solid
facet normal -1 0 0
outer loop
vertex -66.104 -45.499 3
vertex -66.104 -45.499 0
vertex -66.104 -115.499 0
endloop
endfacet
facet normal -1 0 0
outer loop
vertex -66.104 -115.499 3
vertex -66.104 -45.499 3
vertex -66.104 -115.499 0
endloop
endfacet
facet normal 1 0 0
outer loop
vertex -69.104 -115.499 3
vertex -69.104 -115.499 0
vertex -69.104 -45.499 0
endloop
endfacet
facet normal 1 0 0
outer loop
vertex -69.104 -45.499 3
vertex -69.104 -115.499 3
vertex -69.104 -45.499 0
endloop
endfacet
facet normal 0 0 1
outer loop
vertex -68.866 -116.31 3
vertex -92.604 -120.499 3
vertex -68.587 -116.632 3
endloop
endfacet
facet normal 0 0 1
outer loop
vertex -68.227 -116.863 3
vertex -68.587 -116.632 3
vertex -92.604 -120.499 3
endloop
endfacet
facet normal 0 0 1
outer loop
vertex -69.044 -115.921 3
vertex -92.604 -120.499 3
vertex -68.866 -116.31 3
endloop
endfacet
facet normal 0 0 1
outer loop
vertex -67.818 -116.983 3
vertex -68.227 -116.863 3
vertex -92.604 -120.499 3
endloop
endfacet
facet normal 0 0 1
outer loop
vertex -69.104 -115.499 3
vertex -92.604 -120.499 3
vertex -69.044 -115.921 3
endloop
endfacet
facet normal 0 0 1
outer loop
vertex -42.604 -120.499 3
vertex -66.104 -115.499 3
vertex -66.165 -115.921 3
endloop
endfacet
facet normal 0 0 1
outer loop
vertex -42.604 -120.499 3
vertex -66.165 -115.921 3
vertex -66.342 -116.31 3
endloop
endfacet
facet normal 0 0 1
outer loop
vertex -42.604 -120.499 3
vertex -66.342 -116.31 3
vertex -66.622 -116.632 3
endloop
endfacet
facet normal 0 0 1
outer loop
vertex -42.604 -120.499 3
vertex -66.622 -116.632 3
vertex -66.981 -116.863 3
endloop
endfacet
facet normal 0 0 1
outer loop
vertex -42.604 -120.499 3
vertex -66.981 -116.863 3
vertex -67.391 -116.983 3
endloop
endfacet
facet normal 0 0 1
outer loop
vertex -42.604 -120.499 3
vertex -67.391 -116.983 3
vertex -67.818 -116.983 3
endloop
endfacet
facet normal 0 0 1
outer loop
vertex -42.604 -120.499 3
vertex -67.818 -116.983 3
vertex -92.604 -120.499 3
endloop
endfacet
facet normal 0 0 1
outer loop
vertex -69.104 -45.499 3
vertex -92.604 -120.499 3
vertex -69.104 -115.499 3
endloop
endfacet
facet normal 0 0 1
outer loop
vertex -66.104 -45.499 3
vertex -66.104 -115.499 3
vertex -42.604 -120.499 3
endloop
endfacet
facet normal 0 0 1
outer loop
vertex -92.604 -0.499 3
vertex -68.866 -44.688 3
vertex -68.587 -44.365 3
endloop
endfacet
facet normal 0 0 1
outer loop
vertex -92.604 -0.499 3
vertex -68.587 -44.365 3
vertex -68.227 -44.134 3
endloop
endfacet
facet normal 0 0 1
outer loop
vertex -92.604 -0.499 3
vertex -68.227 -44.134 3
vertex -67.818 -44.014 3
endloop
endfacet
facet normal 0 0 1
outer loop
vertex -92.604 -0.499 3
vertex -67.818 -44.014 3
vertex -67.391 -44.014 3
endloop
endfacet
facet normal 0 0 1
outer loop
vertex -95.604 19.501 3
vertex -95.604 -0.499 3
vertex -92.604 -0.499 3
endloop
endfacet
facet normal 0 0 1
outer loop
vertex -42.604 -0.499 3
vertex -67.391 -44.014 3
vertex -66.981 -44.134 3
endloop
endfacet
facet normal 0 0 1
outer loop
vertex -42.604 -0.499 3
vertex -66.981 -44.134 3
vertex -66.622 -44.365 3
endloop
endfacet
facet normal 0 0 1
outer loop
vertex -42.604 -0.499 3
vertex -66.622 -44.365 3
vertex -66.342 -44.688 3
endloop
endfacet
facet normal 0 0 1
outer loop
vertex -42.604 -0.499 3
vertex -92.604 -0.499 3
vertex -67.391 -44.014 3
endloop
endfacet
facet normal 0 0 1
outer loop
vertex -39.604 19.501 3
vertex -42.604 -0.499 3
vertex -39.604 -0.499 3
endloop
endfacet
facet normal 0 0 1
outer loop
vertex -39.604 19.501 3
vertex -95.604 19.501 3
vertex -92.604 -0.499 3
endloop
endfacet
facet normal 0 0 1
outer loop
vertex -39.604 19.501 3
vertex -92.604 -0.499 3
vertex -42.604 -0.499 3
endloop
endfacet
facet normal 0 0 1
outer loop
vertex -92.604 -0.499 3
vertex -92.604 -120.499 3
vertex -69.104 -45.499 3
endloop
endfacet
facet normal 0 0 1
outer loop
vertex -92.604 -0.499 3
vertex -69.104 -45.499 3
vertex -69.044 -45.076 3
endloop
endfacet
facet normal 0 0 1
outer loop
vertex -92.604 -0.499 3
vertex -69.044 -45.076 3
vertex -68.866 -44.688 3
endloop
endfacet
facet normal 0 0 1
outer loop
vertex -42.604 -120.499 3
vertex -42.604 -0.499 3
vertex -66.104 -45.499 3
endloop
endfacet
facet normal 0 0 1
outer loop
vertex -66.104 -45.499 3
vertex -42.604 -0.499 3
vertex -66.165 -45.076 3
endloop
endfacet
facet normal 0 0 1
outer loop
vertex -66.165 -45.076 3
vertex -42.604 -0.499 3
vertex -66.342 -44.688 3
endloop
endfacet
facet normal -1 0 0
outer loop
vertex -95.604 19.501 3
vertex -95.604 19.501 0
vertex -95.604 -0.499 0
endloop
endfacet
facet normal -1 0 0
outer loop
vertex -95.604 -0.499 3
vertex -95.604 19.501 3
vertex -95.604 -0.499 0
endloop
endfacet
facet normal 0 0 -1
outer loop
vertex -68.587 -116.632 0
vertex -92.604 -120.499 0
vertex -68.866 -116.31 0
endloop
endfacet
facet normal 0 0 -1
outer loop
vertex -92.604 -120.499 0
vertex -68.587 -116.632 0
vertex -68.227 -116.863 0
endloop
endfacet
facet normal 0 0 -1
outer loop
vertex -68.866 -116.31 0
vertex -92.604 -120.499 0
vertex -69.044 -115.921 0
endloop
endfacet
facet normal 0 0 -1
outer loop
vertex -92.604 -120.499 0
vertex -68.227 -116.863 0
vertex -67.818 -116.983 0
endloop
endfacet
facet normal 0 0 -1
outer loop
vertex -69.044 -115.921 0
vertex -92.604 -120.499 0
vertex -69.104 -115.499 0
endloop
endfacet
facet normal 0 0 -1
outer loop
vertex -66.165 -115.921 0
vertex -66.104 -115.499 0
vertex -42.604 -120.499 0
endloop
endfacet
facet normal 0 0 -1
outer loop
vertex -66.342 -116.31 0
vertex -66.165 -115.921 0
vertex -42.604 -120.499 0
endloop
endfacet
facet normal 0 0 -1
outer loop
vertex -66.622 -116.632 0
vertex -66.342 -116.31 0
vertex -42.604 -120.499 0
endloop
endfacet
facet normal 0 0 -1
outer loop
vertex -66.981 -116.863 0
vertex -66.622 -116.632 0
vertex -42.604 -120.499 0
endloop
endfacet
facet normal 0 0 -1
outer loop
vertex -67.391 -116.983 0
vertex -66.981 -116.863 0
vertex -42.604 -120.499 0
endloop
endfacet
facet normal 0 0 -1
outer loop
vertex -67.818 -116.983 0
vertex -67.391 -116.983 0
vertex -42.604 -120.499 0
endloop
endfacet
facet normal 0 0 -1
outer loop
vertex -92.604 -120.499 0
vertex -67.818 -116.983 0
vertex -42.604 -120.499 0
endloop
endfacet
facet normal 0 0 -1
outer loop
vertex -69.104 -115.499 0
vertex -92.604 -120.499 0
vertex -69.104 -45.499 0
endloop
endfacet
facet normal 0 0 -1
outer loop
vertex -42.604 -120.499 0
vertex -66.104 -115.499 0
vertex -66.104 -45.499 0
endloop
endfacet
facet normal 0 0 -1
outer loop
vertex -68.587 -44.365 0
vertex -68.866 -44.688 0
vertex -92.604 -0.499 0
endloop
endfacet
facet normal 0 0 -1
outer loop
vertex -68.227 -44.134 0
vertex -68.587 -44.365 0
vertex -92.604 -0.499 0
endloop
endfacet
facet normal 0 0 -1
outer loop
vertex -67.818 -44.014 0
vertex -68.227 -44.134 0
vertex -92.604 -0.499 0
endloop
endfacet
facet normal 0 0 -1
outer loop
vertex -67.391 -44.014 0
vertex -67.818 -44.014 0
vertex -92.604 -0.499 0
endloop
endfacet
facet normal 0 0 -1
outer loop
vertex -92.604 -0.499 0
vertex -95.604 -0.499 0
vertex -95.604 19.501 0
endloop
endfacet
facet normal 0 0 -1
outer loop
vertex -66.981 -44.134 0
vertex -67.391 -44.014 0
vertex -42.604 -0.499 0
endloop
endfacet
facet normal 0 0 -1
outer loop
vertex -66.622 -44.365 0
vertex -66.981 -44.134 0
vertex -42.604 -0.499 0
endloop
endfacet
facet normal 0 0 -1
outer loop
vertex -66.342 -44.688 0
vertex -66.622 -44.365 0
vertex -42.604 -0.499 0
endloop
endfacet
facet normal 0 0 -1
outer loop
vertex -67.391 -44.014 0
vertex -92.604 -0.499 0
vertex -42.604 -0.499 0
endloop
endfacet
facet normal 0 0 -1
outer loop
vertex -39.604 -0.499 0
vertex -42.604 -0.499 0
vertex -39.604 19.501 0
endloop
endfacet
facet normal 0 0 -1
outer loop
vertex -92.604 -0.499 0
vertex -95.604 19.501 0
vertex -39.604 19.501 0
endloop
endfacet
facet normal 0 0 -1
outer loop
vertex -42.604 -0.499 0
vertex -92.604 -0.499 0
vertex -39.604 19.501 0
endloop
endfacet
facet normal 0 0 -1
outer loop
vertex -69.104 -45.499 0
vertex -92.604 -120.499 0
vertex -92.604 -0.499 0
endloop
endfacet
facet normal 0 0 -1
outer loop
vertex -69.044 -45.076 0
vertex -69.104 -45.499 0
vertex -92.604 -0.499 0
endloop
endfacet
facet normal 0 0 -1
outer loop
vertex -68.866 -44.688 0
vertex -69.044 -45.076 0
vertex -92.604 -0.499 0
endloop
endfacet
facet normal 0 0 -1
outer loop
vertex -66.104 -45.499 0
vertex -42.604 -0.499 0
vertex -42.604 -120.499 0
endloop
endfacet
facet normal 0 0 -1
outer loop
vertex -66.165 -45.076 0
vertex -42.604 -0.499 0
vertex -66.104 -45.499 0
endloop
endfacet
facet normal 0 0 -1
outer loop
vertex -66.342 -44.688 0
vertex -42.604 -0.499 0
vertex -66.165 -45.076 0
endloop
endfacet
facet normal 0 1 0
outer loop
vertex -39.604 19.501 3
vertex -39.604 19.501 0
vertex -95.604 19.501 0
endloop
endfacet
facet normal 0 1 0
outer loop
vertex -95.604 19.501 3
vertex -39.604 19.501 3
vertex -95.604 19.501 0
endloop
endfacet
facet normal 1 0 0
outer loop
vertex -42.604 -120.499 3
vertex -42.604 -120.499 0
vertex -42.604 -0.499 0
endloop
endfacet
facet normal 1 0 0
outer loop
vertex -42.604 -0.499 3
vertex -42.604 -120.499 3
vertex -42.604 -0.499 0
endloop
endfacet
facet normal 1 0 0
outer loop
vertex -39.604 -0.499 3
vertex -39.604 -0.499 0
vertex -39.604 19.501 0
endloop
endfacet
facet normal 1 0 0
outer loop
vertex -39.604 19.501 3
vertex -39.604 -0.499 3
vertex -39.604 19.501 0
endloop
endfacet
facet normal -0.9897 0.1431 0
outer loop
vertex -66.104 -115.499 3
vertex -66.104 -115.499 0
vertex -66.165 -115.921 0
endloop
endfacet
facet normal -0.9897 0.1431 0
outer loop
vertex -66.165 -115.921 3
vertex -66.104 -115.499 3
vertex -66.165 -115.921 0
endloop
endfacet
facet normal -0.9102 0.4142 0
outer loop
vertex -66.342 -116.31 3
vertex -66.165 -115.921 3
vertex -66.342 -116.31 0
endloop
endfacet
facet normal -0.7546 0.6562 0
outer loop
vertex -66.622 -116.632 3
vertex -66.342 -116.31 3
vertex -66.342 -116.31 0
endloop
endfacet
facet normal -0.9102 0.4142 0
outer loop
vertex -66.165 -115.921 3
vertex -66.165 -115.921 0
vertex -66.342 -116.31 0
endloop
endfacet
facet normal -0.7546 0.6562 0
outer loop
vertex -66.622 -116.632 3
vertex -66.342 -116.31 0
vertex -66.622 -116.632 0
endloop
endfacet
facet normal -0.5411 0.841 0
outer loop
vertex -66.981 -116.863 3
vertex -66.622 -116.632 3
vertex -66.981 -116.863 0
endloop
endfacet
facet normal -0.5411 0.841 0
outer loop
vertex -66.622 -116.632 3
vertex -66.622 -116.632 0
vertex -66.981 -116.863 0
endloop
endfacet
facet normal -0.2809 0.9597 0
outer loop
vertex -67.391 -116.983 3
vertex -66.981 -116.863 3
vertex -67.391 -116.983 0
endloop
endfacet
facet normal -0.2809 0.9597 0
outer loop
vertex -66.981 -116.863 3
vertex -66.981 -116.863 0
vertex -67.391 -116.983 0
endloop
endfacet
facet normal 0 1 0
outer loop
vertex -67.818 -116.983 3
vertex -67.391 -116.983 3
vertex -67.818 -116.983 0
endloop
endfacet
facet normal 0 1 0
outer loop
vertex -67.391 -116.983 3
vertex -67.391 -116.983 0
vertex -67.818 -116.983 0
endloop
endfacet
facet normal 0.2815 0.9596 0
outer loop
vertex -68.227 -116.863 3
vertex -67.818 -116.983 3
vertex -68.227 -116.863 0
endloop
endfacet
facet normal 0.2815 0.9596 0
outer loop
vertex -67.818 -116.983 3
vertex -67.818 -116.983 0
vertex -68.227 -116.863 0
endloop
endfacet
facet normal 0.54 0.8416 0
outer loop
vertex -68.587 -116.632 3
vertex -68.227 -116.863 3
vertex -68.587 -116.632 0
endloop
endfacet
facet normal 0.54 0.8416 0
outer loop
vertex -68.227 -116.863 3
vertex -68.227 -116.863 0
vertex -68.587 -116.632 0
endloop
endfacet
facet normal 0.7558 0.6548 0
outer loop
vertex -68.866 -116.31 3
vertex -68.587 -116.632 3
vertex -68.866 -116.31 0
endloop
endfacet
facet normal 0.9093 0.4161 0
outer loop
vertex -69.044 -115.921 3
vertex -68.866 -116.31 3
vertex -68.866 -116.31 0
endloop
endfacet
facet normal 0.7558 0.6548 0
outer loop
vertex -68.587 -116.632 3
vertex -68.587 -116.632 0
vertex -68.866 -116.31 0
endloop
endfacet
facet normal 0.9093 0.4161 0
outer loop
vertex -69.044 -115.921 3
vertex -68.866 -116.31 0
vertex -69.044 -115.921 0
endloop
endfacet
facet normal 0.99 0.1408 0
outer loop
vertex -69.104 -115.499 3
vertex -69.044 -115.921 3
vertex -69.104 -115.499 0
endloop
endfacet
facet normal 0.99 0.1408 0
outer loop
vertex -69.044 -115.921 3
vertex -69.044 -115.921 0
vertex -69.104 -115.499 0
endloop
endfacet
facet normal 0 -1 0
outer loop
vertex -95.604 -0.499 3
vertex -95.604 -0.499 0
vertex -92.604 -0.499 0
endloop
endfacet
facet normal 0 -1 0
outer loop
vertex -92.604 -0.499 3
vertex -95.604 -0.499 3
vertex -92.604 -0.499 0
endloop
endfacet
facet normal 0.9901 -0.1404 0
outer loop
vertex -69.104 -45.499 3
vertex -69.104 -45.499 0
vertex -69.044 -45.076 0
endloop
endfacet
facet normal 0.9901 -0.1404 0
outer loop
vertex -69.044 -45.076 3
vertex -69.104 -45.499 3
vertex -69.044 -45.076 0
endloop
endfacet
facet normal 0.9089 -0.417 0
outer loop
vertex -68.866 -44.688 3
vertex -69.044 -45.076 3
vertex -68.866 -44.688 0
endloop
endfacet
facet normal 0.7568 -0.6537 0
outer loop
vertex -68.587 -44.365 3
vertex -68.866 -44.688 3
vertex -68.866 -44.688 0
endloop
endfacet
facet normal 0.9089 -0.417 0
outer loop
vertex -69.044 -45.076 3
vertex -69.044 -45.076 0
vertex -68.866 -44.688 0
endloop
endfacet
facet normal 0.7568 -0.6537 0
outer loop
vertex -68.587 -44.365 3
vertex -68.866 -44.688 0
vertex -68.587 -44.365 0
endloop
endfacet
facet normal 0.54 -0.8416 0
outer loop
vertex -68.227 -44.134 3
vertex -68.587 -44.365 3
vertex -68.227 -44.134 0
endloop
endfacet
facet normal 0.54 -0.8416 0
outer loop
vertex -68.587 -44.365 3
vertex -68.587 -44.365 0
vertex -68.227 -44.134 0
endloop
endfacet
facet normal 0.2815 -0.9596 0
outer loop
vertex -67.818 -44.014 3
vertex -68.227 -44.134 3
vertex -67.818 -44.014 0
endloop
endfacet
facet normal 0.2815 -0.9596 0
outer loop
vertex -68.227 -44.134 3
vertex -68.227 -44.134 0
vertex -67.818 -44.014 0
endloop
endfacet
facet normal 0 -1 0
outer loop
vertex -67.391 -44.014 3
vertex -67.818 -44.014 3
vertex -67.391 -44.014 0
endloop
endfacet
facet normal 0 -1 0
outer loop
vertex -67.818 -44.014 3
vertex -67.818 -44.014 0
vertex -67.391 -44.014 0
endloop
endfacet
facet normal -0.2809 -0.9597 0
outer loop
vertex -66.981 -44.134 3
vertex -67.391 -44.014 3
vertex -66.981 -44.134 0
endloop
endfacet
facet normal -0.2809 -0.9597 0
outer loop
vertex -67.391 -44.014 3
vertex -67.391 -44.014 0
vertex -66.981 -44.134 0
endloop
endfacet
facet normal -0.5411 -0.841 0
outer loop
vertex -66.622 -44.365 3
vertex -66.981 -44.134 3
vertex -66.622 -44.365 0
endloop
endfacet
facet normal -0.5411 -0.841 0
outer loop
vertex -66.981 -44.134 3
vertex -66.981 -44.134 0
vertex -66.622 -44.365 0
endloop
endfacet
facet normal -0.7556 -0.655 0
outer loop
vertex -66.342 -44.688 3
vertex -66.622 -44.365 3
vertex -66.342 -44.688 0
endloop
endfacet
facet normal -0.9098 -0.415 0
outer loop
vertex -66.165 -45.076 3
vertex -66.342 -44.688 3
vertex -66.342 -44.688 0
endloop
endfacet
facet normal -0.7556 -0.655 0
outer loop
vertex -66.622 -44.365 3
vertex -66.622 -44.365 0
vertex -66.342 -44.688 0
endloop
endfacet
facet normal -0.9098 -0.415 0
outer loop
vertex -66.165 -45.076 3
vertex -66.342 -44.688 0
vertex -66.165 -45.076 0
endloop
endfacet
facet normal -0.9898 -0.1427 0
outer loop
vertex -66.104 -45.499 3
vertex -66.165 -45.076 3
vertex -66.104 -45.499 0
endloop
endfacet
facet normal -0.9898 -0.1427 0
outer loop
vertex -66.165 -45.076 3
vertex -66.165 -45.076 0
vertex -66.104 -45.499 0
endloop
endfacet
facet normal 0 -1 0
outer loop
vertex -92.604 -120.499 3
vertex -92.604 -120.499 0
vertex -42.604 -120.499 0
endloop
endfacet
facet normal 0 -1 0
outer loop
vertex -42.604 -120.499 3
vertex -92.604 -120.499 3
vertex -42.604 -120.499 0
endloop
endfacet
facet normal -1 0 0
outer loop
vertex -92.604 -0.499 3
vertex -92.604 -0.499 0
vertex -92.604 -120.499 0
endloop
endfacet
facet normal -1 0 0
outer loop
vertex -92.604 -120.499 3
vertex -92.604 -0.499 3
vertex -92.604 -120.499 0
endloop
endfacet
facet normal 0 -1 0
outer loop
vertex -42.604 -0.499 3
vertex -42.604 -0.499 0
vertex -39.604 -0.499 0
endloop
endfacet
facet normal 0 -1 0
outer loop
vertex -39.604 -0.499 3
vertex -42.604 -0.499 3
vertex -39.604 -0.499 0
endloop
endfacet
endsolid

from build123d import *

# Parameters (mm, degrees)
F1_DEPTH = 3


with BuildPart() as f1:
    # F0 (on Top) → F1 (new body)
    with BuildSketch(Plane.XY):
        Polygon((-92.604274, -0.498616), (-92.604274, -120.498616), (-42.604274, -120.498616), (-42.604274, -0.498616), (-39.604274, -0.498616), (-39.604274, 19.501384), (-42.604274, 19.501384), (-92.604274, 19.501384), (-95.604274, 19.501384), (-95.604274, -0.498616), align=None)
        with BuildLine():
            Line((-69.104274, -115.498616), (-69.104274, -45.498616))
            ThreePointArc((-69.104274, -45.498616), (-67.604274, -43.998616), (-66.104274, -45.498616))
            Line((-66.104274, -45.498616), (-66.104274, -115.498616))
            ThreePointArc((-66.104274, -115.498616), (-67.604274, -116.998616), (-69.104274, -115.498616))
        make_face(mode=Mode.SUBTRACT)
    extrude(amount=F1_DEPTH)


solid = f1.part
